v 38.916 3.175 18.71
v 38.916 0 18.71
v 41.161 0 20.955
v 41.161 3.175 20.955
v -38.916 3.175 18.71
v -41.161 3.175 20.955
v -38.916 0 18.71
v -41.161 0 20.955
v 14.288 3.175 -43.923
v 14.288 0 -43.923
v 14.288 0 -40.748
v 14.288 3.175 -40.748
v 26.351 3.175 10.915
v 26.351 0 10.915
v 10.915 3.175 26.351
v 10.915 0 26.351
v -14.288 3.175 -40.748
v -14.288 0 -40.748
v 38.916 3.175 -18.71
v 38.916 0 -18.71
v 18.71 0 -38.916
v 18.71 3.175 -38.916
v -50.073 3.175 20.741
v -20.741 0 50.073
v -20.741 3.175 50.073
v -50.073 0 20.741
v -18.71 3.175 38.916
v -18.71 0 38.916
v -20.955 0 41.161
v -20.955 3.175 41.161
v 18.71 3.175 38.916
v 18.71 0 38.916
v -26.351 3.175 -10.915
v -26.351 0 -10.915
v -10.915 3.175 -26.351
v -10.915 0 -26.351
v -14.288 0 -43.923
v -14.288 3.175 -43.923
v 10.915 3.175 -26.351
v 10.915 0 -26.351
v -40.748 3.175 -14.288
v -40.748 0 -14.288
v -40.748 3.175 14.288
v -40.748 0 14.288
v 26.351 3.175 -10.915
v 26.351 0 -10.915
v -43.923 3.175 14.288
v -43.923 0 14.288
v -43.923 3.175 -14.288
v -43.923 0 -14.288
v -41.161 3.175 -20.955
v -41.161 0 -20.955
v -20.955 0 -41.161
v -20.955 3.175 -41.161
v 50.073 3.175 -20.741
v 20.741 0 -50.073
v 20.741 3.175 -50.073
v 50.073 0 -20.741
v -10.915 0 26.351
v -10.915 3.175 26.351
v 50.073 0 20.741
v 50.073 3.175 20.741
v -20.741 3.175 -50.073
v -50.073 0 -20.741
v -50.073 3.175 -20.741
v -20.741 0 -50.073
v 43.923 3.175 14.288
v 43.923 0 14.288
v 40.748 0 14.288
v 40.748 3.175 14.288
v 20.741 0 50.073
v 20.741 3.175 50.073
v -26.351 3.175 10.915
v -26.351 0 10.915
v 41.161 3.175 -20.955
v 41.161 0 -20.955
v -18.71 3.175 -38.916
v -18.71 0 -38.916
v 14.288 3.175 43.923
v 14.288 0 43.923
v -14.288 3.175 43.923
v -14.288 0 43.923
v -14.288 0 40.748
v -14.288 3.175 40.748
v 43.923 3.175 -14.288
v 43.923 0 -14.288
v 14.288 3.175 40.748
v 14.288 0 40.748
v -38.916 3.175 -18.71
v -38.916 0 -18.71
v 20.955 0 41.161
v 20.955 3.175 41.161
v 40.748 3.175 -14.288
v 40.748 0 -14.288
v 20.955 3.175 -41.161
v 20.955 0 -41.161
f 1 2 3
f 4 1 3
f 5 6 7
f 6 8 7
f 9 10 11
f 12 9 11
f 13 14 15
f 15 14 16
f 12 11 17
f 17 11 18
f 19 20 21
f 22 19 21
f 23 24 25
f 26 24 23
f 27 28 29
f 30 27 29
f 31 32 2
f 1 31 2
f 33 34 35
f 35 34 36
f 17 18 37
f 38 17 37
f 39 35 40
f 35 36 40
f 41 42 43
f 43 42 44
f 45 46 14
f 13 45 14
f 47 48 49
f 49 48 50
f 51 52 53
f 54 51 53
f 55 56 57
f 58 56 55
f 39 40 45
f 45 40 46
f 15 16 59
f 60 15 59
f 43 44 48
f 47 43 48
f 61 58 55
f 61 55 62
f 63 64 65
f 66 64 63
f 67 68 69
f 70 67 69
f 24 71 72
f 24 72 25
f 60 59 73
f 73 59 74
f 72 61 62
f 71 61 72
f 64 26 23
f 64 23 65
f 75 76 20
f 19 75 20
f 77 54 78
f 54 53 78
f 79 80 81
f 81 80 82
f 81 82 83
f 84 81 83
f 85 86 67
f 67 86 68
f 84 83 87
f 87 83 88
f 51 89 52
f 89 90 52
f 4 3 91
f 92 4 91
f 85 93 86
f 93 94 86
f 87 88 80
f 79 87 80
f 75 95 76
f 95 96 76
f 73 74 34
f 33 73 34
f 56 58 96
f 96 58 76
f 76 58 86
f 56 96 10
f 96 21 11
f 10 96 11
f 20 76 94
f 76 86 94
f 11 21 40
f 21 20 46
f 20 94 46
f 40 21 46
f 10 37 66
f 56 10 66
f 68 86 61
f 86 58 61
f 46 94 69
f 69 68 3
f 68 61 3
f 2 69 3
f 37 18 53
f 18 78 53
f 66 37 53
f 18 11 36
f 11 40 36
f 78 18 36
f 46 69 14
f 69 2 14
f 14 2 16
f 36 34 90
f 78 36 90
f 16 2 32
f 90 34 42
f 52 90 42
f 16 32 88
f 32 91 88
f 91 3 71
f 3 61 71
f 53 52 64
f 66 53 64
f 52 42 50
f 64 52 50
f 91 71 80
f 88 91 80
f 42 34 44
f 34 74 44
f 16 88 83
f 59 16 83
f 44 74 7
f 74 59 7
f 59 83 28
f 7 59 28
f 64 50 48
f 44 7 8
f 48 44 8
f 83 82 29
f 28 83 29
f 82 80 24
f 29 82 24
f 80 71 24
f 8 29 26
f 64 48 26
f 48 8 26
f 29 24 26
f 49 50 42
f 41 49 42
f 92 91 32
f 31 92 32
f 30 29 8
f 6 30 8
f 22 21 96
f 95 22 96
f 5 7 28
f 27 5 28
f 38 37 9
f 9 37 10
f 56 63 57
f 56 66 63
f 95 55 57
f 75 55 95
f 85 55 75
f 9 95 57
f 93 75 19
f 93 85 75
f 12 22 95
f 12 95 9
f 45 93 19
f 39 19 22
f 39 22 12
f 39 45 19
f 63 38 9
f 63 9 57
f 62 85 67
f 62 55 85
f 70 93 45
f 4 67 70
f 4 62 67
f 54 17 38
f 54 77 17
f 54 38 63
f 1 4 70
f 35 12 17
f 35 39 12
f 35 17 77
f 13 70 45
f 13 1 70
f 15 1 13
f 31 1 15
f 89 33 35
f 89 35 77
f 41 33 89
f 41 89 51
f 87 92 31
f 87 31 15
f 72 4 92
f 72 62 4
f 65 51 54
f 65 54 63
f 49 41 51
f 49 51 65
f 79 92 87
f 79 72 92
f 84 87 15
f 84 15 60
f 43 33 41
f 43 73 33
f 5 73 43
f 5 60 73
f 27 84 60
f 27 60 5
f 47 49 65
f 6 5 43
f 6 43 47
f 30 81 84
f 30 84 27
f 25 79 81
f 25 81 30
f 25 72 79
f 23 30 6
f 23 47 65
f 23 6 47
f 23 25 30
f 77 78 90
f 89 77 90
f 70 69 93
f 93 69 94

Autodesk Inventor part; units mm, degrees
ref_plane "YZ Plane" through (0, 0, 0) normal (1, 0, 0) x (0, 1, 0)
ref_plane "XZ Plane" through (0, 0, 0) normal (0, 1, 0) x (-1, 0, 0)
ref_plane "XY Plane" through (0, 0, 0) normal (0, 0, 1) x (1, 0, 0)
sketch "Sketch1" plane through (0, 0, 0) normal (0, 1, 0) x (-1, 0, 0)
  line L0 (-14.2875, -40.7478) -> (14.2875, -40.7478)
  line L1 (14.2875, -40.7478) -> (14.2875, -43.9228)
  line L2 (14.2875, -43.9228) -> (-14.2875, -43.9228)
  line L3 (-14.2875, -43.9228) -> (-14.2875, -40.7478)
  line L4 (18.7102, -38.9158) -> (38.9158, -18.7102)
  line L5 (38.9158, -18.7102) -> (41.1609, -20.9553)
  line L6 (41.1609, -20.9553) -> (20.9553, -41.1609)
  line L7 (20.9553, -41.1609) -> (18.7102, -38.9158)
  line L8 (40.7478, -14.2875) -> (40.7478, 14.2875)
  line L9 (40.7478, 14.2875) -> (43.9228, 14.2875)
  line L10 (43.9228, 14.2875) -> (43.9228, -14.2875)
  line L11 (43.9228, -14.2875) -> (40.7478, -14.2875)
  line L12 (38.9158, 18.7102) -> (18.7102, 38.9158)
  line L13 (18.7102, 38.9158) -> (20.9553, 41.1609)
  line L14 (20.9553, 41.1609) -> (41.1609, 20.9553)
  line L15 (41.1609, 20.9553) -> (38.9158, 18.7102)
  line L16 (14.2875, 40.7478) -> (-14.2875, 40.7478)
  line L17 (-14.2875, 40.7478) -> (-14.2875, 43.9228)
  line L18 (-14.2875, 43.9228) -> (14.2875, 43.9228)
  line L19 (14.2875, 43.9228) -> (14.2875, 40.7478)
  line L20 (-18.7102, 38.9158) -> (-38.9158, 18.7102)
  line L21 (-38.9158, 18.7102) -> (-41.1609, 20.9553)
  line L22 (-41.1609, 20.9553) -> (-20.9553, 41.1609)
  line L23 (-20.9553, 41.1609) -> (-18.7102, 38.9158)
  line L24 (-40.7478, 14.2875) -> (-40.7478, -14.2875)
  line L25 (-40.7478, -14.2875) -> (-43.9228, -14.2875)
  line L26 (-43.9228, -14.2875) -> (-43.9228, 14.2875)
  line L27 (-43.9228, 14.2875) -> (-40.7478, 14.2875)
  line L28 (-38.9158, -18.7102) -> (-18.7102, -38.9158)
  line L29 (-18.7102, -38.9158) -> (-20.9553, -41.1609)
  line L30 (-20.9553, -41.1609) -> (-41.1609, -20.9553)
  line L31 (-41.1609, -20.9553) -> (-38.9158, -18.7102)
  line L32 (50.0728, -20.7409) -> (20.7409, -50.0728)
  line L33 (20.7409, -50.0728) -> (-20.7409, -50.0728)
  line L34 (-20.7409, -50.0728) -> (-50.0728, -20.7409)
  line L35 (-50.0728, -20.7409) -> (-50.0728, 20.7409)
  line L36 (-50.0728, 20.7409) -> (-20.7409, 50.0728)
  line L37 (-20.7409, 50.0728) -> (20.7409, 50.0728)
  line L38 (20.7409, 50.0728) -> (50.0728, 20.7409)
  line L39 (50.0728, 20.7409) -> (50.0728, -20.7409)
  line L40 (26.3506, -10.9148) -> (10.9148, -26.3506)
  line L41 (10.9148, -26.3506) -> (-10.9148, -26.3506)
  line L42 (-10.9148, -26.3506) -> (-26.3506, -10.9148)
  line L43 (-26.3506, -10.9148) -> (-26.3506, 10.9148)
  line L44 (-26.3506, 10.9148) -> (-10.9148, 26.3506)
  line L45 (-10.9148, 26.3506) -> (10.9148, 26.3506)
  line L46 (10.9148, 26.3506) -> (26.3506, 10.9148)
  line L47 (26.3506, 10.9148) -> (26.3506, -10.9148)
  point P0 (0, 0)
  point P1 (0, 0)
  point P2 (0, 0)
  point P3 (0, 0)
  dimension "d0" = 28.575
  dimension "d1" = 3.175
  dimension "d2" = 43.18
  dimension "d3" = 43.18
  dimension "d6" = 360
extrude "Extrusion1" add sketch "Sketch1" along normal blind 3.175
equation "\"d3\" = d2"
properties part number "octoBotoStemRingLarger01"
